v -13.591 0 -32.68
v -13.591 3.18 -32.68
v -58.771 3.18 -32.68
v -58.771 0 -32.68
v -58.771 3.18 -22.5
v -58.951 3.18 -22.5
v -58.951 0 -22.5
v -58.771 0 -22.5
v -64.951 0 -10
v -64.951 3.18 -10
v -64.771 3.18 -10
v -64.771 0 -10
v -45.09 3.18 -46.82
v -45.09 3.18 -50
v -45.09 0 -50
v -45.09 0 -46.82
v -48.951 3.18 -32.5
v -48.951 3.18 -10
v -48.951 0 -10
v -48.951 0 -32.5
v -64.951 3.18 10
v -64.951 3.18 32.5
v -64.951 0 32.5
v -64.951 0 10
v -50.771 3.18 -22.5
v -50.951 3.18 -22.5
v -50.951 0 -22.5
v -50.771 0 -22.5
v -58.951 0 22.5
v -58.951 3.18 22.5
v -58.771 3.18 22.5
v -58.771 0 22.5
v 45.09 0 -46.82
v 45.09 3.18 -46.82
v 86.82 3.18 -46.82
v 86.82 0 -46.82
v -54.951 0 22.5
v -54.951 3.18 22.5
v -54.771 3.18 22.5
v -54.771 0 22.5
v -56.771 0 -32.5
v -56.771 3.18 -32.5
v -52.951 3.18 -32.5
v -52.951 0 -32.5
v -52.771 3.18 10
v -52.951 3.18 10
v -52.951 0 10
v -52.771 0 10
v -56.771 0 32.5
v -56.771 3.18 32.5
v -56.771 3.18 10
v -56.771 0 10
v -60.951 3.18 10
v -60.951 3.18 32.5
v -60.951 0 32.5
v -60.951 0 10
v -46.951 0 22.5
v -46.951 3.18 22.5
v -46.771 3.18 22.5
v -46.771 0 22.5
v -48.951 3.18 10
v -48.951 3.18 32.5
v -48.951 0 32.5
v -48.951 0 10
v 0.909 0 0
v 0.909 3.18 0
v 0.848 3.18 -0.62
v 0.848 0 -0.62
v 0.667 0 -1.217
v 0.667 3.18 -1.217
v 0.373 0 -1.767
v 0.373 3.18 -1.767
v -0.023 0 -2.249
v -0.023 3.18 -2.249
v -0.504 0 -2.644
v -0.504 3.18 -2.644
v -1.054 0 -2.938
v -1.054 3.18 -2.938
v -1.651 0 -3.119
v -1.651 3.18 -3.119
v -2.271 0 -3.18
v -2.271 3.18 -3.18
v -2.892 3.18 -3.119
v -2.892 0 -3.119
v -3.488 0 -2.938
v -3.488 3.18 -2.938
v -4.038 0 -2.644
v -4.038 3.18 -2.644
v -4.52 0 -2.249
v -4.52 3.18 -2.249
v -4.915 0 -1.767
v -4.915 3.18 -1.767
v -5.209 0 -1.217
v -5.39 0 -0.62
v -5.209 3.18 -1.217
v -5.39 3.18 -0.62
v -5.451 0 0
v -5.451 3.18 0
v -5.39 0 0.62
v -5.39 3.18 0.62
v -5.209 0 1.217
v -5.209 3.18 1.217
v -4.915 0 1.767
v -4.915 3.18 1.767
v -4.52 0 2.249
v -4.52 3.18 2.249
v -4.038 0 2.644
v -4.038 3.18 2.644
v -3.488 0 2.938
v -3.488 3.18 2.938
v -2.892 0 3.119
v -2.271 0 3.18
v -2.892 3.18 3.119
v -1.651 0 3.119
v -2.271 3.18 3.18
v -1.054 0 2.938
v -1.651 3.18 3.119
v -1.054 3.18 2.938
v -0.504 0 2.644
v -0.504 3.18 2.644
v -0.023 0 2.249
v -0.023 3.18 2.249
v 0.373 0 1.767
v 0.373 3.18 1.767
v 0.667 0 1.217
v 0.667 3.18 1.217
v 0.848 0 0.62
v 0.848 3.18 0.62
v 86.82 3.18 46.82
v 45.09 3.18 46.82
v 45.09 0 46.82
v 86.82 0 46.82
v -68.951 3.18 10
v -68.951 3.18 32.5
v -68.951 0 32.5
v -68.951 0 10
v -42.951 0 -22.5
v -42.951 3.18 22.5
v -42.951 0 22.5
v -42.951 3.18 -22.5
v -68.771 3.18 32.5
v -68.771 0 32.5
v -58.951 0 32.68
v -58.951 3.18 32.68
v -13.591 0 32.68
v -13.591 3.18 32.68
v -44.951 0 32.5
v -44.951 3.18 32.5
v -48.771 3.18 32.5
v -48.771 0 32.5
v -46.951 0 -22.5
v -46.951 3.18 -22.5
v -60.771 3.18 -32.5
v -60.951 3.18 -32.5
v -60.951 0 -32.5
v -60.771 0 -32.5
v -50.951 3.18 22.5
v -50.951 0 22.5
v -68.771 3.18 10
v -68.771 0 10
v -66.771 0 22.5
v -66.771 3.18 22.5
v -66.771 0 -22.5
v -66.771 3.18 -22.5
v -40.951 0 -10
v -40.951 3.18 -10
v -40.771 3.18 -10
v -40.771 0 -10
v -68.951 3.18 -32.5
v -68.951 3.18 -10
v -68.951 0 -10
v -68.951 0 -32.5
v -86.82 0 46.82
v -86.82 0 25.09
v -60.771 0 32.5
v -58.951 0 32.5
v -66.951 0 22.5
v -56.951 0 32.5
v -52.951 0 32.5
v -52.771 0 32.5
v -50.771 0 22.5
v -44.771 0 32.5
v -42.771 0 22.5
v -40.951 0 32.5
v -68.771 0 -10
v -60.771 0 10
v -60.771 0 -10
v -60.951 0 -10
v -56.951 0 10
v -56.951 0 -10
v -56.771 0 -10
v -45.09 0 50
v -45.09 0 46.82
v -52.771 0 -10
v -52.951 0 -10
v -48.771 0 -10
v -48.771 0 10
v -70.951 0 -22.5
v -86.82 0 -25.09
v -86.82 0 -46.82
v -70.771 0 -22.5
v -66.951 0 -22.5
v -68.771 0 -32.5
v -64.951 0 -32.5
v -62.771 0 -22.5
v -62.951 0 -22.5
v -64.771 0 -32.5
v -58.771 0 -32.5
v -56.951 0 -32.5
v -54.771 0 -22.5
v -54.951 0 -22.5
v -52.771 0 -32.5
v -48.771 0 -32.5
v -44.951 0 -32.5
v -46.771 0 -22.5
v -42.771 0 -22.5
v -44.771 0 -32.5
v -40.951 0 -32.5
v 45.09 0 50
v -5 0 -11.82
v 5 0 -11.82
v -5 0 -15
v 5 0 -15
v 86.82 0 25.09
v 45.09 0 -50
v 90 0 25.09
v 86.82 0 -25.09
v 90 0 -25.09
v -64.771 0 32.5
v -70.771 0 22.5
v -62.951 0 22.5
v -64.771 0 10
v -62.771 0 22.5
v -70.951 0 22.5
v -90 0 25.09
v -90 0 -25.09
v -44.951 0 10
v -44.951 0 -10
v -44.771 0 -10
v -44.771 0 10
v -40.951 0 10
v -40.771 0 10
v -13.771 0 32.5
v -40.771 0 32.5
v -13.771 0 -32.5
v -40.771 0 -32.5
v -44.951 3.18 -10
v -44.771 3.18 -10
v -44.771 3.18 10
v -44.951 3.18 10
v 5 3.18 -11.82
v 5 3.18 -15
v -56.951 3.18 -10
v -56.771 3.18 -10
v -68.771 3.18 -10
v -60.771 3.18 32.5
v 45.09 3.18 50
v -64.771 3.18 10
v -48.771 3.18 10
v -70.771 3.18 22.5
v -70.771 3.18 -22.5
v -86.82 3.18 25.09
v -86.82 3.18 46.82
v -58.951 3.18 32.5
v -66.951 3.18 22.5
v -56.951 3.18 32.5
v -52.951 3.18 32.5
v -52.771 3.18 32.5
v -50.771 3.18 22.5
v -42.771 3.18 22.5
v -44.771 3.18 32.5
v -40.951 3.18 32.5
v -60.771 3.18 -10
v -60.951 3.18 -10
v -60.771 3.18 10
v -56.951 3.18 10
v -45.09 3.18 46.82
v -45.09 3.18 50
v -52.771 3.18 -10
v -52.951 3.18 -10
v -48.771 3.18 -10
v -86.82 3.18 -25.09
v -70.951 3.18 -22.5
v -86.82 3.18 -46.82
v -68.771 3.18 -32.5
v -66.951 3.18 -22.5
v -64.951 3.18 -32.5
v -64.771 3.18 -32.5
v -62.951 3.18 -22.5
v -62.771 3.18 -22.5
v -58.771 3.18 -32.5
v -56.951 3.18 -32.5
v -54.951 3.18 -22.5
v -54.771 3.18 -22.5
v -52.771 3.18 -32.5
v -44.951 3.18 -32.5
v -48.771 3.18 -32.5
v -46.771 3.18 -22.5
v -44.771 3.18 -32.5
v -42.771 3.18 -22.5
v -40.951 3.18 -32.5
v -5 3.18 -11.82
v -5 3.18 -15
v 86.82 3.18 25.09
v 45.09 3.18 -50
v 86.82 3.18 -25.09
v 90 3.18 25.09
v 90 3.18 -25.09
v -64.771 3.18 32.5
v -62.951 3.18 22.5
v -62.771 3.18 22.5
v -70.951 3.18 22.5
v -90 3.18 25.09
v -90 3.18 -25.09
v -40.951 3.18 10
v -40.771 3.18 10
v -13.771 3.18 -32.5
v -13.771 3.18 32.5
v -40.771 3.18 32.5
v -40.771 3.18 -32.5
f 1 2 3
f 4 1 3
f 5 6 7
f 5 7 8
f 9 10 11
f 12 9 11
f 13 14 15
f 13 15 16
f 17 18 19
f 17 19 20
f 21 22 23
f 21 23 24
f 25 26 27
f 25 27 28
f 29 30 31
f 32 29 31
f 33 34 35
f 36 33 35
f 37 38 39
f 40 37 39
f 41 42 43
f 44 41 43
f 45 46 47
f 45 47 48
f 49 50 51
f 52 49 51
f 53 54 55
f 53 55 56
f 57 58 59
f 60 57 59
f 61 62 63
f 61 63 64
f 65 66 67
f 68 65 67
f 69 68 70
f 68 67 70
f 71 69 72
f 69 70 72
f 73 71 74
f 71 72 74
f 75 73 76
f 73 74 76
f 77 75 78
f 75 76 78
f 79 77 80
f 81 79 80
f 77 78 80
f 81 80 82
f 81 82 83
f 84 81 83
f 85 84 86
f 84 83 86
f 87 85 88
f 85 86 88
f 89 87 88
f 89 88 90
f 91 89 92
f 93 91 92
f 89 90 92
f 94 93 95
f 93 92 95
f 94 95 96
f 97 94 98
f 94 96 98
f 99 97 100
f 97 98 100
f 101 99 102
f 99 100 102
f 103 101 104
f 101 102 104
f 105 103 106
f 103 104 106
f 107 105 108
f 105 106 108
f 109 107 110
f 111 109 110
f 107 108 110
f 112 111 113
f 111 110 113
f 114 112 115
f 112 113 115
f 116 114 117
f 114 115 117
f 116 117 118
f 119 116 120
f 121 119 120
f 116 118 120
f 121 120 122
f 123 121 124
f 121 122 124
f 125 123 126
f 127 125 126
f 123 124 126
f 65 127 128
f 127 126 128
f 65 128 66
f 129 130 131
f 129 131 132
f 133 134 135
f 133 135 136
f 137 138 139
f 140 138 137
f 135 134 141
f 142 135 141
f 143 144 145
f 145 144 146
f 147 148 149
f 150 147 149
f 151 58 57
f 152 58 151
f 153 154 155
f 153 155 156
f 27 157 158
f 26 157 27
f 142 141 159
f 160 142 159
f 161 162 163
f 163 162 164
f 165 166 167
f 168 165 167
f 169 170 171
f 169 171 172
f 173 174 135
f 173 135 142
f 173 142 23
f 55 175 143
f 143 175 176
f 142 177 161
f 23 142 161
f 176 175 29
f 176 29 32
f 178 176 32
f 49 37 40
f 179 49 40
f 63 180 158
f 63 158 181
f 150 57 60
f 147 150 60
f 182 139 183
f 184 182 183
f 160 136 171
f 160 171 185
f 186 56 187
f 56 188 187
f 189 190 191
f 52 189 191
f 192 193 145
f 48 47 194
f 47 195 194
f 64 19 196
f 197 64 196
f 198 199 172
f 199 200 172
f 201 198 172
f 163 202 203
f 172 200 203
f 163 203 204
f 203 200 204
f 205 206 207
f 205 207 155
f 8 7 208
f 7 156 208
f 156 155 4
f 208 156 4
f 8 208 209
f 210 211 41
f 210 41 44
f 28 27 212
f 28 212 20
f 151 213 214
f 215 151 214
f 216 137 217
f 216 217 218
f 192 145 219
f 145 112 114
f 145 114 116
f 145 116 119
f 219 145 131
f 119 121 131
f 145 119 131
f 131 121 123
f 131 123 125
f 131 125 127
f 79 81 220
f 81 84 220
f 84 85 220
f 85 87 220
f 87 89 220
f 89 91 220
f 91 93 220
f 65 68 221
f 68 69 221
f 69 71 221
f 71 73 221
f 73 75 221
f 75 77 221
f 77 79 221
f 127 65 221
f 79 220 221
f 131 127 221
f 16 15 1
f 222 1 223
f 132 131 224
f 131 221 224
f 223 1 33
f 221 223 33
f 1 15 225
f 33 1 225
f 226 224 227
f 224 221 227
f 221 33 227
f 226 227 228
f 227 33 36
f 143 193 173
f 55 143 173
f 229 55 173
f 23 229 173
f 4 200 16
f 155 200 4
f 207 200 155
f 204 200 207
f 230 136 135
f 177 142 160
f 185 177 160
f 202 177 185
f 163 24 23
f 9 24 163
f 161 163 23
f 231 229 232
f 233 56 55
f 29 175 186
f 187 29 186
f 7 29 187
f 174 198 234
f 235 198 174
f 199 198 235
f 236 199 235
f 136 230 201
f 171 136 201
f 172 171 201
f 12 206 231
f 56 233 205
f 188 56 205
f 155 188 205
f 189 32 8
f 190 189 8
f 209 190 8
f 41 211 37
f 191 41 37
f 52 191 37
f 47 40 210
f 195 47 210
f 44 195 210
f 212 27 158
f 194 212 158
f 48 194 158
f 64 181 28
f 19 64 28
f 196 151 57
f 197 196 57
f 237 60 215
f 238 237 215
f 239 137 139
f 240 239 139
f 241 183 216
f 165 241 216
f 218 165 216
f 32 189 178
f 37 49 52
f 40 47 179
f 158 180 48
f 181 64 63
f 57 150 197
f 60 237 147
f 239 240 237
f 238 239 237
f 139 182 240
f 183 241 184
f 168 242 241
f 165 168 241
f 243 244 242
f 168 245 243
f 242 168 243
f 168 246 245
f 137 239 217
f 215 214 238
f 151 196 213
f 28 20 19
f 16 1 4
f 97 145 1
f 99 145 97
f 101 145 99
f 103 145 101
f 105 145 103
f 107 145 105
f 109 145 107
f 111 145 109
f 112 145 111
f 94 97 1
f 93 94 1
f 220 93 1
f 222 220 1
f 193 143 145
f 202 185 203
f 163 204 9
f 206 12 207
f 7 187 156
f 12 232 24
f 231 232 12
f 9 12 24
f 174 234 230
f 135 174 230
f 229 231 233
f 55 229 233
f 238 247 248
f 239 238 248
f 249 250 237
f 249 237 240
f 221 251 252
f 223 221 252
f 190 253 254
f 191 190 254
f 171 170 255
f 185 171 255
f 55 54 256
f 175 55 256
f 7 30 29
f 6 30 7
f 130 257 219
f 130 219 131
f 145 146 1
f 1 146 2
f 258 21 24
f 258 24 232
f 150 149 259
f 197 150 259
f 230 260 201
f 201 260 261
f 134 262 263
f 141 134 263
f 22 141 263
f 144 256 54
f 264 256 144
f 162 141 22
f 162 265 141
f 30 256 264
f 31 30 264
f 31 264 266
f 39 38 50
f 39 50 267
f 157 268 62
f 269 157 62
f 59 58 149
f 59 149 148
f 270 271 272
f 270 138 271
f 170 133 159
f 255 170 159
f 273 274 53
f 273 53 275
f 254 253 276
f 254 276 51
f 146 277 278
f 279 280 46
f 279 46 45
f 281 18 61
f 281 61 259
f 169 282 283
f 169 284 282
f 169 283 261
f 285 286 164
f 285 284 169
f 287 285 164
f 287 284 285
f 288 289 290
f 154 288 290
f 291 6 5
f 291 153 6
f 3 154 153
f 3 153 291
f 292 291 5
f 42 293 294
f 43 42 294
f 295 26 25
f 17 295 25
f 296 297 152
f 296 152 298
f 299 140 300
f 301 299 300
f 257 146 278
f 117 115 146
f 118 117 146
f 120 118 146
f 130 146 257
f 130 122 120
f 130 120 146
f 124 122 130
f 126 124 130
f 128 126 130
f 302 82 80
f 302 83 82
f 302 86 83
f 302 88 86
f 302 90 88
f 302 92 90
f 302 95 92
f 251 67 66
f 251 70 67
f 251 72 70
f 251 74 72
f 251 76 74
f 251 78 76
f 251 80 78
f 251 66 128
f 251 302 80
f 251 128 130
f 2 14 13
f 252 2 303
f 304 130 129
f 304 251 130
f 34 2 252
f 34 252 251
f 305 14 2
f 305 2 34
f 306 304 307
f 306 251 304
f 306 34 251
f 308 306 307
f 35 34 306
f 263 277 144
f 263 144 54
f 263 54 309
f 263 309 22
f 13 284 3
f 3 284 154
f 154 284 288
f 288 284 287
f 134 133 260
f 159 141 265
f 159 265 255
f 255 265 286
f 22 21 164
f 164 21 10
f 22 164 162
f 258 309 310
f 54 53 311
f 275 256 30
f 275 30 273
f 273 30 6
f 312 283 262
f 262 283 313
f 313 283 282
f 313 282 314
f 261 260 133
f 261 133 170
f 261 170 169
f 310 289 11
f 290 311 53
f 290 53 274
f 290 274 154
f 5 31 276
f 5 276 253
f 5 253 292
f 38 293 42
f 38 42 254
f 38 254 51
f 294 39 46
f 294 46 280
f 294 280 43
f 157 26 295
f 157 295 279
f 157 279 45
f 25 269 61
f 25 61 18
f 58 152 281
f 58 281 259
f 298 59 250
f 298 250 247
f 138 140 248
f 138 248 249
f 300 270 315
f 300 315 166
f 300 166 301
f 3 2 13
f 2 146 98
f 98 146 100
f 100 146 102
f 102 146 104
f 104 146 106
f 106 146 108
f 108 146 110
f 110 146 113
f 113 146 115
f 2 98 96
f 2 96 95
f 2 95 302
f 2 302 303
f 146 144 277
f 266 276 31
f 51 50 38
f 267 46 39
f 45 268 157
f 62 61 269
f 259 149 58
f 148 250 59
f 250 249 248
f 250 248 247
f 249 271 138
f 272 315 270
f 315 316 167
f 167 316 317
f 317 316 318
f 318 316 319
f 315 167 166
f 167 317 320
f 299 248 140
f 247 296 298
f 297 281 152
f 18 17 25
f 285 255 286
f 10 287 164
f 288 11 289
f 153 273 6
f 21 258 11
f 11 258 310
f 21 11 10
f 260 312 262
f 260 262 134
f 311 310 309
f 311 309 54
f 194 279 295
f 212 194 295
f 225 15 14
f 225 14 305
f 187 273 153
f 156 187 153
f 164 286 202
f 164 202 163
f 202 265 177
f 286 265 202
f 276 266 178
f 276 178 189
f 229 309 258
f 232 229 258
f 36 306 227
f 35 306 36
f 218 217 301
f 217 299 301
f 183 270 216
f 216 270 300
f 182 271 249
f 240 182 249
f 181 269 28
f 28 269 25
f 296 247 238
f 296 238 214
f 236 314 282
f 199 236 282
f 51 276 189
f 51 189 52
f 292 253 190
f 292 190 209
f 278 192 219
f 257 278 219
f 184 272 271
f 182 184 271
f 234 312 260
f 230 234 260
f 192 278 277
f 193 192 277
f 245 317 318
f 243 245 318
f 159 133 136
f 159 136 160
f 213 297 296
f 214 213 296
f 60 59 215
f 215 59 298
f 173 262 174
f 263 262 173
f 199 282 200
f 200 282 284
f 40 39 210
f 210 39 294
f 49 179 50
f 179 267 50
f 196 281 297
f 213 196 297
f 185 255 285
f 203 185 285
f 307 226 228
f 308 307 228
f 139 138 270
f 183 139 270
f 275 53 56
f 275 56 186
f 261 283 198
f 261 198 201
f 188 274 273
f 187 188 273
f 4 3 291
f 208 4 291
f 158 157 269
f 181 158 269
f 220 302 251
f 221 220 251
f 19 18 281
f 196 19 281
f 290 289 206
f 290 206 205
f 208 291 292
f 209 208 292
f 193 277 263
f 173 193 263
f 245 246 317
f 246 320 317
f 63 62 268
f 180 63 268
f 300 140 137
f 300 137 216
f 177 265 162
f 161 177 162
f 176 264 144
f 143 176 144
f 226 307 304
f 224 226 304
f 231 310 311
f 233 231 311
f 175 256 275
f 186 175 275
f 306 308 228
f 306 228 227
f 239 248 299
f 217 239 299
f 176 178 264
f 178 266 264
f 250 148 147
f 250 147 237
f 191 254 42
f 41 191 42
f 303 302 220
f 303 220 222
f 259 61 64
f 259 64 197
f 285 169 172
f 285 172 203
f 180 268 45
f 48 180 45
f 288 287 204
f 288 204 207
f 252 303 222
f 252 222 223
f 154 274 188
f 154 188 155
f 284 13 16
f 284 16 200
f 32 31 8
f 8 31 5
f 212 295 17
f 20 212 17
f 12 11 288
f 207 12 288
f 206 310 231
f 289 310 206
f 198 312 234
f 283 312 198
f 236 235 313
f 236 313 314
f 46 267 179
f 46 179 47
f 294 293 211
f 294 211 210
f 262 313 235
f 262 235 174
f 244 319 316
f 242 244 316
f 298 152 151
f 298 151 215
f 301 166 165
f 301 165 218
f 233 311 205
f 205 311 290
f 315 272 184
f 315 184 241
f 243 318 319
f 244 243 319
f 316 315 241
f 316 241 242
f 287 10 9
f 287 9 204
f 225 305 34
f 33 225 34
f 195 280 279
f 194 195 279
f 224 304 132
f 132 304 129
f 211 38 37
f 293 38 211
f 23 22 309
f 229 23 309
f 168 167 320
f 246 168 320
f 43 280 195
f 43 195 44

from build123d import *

# Parameters (mm, degrees)
SKETCH1_W                    = 180
SKETCH1_H                    = 100
BOSS_EXTRUDE1_DEPTH          = 3.18
SKETCH3_W                    = 44.91
SKETCH3_H                    = 3.18
CUT_EXTRUDE1_DEPTH           = 3.18
MIRROR2_COPY_1_SKETCH_W      = 44.91
MIRROR2_COPY_1_SKETCH_H      = 3.18
MIRROR2_COPY_1_DEPTH         = 3.18
SKETCH4_W                    = 3.18
SKETCH4_H                    = 24.91
CUT_EXTRUDE2_DEPTH           = 3.18
MIRROR4_COPY_1_SKETCH_W      = 3.18
MIRROR4_COPY_1_SKETCH_H      = 24.91
MIRROR4_COPY_1_DEPTH         = 3.18
SKETCH6_R                    = 3.18
CUT_EXTRUDE3_DEPTH           = 3.18
SKETCH7_W                    = 10
SKETCH7_H                    = 3.18
CUT_EXTRUDE4_DEPTH           = 3.18
SKETCH5_W                    = 0.18
SKETCH5_H                    = 45
SKETCH5_H_2                  = 22.5
CUT_EXTRUDE_THIN1_DEPTH      = 10
LPATTERN2_COUNT              = 5
LPATTERN2_PITCH              = 4
LPATTERN2_COL_COUNT          = 4
LPATTERN2_COL_PITCH          = 4
CUT_EXTRUDE_THIN2_DEPTH      = 1
CUT_EXTRUDE_THIN2_DEPTH_BACK = 10


with BuildPart() as part:
    # Sketch1 → Boss-Extrude1 (new body)
    with BuildSketch(Plane(origin=(0, 0, 0), x_dir=(1, 0, 0), z_dir=(0, 1, 0))):
        Rectangle(SKETCH1_W, SKETCH1_H)
    extrude(amount=BOSS_EXTRUDE1_DEPTH)

    # Sketch3 → Cut-Extrude1 (cut)
    with BuildSketch(Plane(origin=(0, 3.18, 0), x_dir=(1, 0, 0), z_dir=(0, 1, 0))):
        with Locations((67.545, -48.41)):
            Rectangle(SKETCH3_W, SKETCH3_H)
    cut_extrude1 = extrude(amount=-CUT_EXTRUDE1_DEPTH, mode=Mode.SUBTRACT)

    # Mirror1: Cut-Extrude1 across plane
    add(cut_extrude1.mirror(Plane(origin=(0, 0, 0), x_dir=(0, 0, 1), z_dir=(1, 0, 0))), mode=Mode.SUBTRACT)

    # Mirror2: Cut-Extrude1 across plane
    add(cut_extrude1.mirror(Plane.XY), mode=Mode.SUBTRACT)

    # Mirror2 copy 1 sketch → Mirror2 copy 1 (cut)
    with BuildSketch(Plane(origin=(0, 3.18, 0), x_dir=(-1, 0, 0), z_dir=(0, 1, 0))):
        with Locations((67.545, -48.41)):
            Rectangle(MIRROR2_COPY_1_SKETCH_W, MIRROR2_COPY_1_SKETCH_H)
    extrude(amount=-MIRROR2_COPY_1_DEPTH, mode=Mode.SUBTRACT)

    # Sketch4 → Cut-Extrude2 (cut)
    with BuildSketch(Plane(origin=(0, 3.18, 0), x_dir=(1, 0, 0), z_dir=(0, 1, 0))):
        with Locations((-88.41, 37.545)):
            Rectangle(SKETCH4_W, SKETCH4_H)
    cut_extrude2 = extrude(amount=-CUT_EXTRUDE2_DEPTH, mode=Mode.SUBTRACT)

    # Mirror3: Cut-Extrude2 across plane
    add(cut_extrude2.mirror(Plane.XY), mode=Mode.SUBTRACT)

    # Mirror4: Cut-Extrude2 across plane
    add(cut_extrude2.mirror(Plane(origin=(0, 0, 0), x_dir=(0, 0, 1), z_dir=(1, 0, 0))), mode=Mode.SUBTRACT)

    # Mirror4 copy 1 sketch → Mirror4 copy 1 (cut)
    with BuildSketch(Plane(origin=(0, 3.18, 0), x_dir=(-1, 0, 0), z_dir=(0, 1, 0))):
        with Locations((-88.41, 37.545)):
            Rectangle(MIRROR4_COPY_1_SKETCH_W, MIRROR4_COPY_1_SKETCH_H)
    extrude(amount=-MIRROR4_COPY_1_DEPTH, mode=Mode.SUBTRACT)

    # Sketch6 → Cut-Extrude3 (cut)
    with BuildSketch(Plane(origin=(0, 3.18, 0), x_dir=(1, 0, 0), z_dir=(0, 1, 0))):
        with Locations((-2.271207142, 0)):
            Circle(SKETCH6_R)
    extrude(amount=-CUT_EXTRUDE3_DEPTH, mode=Mode.SUBTRACT)

    # Sketch7 → Cut-Extrude4 (cut)
    with BuildSketch(Plane(origin=(0, 3.18, 0), x_dir=(1, 0, 0), z_dir=(0, 1, 0))):
        with Locations((0, 13.41)):
            Rectangle(SKETCH7_W, SKETCH7_H)
    extrude(amount=-CUT_EXTRUDE4_DEPTH, mode=Mode.SUBTRACT)

    # Sketch5 → Cut-Extrude-Thin1 (cut)
    with BuildSketch(Plane(origin=(0, 3.18, 0), x_dir=(1, 0, 0), z_dir=(0, 1, 0))):
        with Locations((-58.861207142, 0)):
            Rectangle(SKETCH5_W, SKETCH5_H)
        with Locations((-56.861207142, 21.25)):
            Rectangle(SKETCH5_W, SKETCH5_H_2)
        with Locations((-56.861207142, -21.25)):
            Rectangle(SKETCH5_W, SKETCH5_H_2)
    cut_extrude_thin1 = extrude(amount=-CUT_EXTRUDE_THIN1_DEPTH, mode=Mode.SUBTRACT)

    # LPattern2: Cut-Extrude-Thin1 ×5
    with Locations(*[(i * LPATTERN2_PITCH, 0, 0) for i in range(1, LPATTERN2_COUNT)]):
        add(cut_extrude_thin1, mode=Mode.SUBTRACT)

    # LPattern2 col: Cut-Extrude-Thin1 ×4
    with Locations(*[(-i * LPATTERN2_COL_PITCH, 0, 0) for i in range(1, LPATTERN2_COL_COUNT)]):
        add(cut_extrude_thin1, mode=Mode.SUBTRACT)

    # Sketch9 → Cut-Extrude-Thin2 (cut, two sides)
    with BuildSketch(Plane(origin=(0, 3.18, 0), x_dir=(1, 0, 0), z_dir=(0, 1, 0))) as cut_extrude_thin2_sk:
        Polygon((-58.771207142, 32.5), (-13.771207142, 32.5), (-13.771207142, -32.5), (-58.951207142, -32.5), (-58.951207142, -32.68), (-13.591207142, -32.68), (-13.591207142, 32.68), (-58.771207142, 32.68), align=None)
    extrude(amount=CUT_EXTRUDE_THIN2_DEPTH, mode=Mode.SUBTRACT)
    extrude(cut_extrude_thin2_sk.sketch, amount=-CUT_EXTRUDE_THIN2_DEPTH_BACK, mode=Mode.SUBTRACT)


solid = part.part
